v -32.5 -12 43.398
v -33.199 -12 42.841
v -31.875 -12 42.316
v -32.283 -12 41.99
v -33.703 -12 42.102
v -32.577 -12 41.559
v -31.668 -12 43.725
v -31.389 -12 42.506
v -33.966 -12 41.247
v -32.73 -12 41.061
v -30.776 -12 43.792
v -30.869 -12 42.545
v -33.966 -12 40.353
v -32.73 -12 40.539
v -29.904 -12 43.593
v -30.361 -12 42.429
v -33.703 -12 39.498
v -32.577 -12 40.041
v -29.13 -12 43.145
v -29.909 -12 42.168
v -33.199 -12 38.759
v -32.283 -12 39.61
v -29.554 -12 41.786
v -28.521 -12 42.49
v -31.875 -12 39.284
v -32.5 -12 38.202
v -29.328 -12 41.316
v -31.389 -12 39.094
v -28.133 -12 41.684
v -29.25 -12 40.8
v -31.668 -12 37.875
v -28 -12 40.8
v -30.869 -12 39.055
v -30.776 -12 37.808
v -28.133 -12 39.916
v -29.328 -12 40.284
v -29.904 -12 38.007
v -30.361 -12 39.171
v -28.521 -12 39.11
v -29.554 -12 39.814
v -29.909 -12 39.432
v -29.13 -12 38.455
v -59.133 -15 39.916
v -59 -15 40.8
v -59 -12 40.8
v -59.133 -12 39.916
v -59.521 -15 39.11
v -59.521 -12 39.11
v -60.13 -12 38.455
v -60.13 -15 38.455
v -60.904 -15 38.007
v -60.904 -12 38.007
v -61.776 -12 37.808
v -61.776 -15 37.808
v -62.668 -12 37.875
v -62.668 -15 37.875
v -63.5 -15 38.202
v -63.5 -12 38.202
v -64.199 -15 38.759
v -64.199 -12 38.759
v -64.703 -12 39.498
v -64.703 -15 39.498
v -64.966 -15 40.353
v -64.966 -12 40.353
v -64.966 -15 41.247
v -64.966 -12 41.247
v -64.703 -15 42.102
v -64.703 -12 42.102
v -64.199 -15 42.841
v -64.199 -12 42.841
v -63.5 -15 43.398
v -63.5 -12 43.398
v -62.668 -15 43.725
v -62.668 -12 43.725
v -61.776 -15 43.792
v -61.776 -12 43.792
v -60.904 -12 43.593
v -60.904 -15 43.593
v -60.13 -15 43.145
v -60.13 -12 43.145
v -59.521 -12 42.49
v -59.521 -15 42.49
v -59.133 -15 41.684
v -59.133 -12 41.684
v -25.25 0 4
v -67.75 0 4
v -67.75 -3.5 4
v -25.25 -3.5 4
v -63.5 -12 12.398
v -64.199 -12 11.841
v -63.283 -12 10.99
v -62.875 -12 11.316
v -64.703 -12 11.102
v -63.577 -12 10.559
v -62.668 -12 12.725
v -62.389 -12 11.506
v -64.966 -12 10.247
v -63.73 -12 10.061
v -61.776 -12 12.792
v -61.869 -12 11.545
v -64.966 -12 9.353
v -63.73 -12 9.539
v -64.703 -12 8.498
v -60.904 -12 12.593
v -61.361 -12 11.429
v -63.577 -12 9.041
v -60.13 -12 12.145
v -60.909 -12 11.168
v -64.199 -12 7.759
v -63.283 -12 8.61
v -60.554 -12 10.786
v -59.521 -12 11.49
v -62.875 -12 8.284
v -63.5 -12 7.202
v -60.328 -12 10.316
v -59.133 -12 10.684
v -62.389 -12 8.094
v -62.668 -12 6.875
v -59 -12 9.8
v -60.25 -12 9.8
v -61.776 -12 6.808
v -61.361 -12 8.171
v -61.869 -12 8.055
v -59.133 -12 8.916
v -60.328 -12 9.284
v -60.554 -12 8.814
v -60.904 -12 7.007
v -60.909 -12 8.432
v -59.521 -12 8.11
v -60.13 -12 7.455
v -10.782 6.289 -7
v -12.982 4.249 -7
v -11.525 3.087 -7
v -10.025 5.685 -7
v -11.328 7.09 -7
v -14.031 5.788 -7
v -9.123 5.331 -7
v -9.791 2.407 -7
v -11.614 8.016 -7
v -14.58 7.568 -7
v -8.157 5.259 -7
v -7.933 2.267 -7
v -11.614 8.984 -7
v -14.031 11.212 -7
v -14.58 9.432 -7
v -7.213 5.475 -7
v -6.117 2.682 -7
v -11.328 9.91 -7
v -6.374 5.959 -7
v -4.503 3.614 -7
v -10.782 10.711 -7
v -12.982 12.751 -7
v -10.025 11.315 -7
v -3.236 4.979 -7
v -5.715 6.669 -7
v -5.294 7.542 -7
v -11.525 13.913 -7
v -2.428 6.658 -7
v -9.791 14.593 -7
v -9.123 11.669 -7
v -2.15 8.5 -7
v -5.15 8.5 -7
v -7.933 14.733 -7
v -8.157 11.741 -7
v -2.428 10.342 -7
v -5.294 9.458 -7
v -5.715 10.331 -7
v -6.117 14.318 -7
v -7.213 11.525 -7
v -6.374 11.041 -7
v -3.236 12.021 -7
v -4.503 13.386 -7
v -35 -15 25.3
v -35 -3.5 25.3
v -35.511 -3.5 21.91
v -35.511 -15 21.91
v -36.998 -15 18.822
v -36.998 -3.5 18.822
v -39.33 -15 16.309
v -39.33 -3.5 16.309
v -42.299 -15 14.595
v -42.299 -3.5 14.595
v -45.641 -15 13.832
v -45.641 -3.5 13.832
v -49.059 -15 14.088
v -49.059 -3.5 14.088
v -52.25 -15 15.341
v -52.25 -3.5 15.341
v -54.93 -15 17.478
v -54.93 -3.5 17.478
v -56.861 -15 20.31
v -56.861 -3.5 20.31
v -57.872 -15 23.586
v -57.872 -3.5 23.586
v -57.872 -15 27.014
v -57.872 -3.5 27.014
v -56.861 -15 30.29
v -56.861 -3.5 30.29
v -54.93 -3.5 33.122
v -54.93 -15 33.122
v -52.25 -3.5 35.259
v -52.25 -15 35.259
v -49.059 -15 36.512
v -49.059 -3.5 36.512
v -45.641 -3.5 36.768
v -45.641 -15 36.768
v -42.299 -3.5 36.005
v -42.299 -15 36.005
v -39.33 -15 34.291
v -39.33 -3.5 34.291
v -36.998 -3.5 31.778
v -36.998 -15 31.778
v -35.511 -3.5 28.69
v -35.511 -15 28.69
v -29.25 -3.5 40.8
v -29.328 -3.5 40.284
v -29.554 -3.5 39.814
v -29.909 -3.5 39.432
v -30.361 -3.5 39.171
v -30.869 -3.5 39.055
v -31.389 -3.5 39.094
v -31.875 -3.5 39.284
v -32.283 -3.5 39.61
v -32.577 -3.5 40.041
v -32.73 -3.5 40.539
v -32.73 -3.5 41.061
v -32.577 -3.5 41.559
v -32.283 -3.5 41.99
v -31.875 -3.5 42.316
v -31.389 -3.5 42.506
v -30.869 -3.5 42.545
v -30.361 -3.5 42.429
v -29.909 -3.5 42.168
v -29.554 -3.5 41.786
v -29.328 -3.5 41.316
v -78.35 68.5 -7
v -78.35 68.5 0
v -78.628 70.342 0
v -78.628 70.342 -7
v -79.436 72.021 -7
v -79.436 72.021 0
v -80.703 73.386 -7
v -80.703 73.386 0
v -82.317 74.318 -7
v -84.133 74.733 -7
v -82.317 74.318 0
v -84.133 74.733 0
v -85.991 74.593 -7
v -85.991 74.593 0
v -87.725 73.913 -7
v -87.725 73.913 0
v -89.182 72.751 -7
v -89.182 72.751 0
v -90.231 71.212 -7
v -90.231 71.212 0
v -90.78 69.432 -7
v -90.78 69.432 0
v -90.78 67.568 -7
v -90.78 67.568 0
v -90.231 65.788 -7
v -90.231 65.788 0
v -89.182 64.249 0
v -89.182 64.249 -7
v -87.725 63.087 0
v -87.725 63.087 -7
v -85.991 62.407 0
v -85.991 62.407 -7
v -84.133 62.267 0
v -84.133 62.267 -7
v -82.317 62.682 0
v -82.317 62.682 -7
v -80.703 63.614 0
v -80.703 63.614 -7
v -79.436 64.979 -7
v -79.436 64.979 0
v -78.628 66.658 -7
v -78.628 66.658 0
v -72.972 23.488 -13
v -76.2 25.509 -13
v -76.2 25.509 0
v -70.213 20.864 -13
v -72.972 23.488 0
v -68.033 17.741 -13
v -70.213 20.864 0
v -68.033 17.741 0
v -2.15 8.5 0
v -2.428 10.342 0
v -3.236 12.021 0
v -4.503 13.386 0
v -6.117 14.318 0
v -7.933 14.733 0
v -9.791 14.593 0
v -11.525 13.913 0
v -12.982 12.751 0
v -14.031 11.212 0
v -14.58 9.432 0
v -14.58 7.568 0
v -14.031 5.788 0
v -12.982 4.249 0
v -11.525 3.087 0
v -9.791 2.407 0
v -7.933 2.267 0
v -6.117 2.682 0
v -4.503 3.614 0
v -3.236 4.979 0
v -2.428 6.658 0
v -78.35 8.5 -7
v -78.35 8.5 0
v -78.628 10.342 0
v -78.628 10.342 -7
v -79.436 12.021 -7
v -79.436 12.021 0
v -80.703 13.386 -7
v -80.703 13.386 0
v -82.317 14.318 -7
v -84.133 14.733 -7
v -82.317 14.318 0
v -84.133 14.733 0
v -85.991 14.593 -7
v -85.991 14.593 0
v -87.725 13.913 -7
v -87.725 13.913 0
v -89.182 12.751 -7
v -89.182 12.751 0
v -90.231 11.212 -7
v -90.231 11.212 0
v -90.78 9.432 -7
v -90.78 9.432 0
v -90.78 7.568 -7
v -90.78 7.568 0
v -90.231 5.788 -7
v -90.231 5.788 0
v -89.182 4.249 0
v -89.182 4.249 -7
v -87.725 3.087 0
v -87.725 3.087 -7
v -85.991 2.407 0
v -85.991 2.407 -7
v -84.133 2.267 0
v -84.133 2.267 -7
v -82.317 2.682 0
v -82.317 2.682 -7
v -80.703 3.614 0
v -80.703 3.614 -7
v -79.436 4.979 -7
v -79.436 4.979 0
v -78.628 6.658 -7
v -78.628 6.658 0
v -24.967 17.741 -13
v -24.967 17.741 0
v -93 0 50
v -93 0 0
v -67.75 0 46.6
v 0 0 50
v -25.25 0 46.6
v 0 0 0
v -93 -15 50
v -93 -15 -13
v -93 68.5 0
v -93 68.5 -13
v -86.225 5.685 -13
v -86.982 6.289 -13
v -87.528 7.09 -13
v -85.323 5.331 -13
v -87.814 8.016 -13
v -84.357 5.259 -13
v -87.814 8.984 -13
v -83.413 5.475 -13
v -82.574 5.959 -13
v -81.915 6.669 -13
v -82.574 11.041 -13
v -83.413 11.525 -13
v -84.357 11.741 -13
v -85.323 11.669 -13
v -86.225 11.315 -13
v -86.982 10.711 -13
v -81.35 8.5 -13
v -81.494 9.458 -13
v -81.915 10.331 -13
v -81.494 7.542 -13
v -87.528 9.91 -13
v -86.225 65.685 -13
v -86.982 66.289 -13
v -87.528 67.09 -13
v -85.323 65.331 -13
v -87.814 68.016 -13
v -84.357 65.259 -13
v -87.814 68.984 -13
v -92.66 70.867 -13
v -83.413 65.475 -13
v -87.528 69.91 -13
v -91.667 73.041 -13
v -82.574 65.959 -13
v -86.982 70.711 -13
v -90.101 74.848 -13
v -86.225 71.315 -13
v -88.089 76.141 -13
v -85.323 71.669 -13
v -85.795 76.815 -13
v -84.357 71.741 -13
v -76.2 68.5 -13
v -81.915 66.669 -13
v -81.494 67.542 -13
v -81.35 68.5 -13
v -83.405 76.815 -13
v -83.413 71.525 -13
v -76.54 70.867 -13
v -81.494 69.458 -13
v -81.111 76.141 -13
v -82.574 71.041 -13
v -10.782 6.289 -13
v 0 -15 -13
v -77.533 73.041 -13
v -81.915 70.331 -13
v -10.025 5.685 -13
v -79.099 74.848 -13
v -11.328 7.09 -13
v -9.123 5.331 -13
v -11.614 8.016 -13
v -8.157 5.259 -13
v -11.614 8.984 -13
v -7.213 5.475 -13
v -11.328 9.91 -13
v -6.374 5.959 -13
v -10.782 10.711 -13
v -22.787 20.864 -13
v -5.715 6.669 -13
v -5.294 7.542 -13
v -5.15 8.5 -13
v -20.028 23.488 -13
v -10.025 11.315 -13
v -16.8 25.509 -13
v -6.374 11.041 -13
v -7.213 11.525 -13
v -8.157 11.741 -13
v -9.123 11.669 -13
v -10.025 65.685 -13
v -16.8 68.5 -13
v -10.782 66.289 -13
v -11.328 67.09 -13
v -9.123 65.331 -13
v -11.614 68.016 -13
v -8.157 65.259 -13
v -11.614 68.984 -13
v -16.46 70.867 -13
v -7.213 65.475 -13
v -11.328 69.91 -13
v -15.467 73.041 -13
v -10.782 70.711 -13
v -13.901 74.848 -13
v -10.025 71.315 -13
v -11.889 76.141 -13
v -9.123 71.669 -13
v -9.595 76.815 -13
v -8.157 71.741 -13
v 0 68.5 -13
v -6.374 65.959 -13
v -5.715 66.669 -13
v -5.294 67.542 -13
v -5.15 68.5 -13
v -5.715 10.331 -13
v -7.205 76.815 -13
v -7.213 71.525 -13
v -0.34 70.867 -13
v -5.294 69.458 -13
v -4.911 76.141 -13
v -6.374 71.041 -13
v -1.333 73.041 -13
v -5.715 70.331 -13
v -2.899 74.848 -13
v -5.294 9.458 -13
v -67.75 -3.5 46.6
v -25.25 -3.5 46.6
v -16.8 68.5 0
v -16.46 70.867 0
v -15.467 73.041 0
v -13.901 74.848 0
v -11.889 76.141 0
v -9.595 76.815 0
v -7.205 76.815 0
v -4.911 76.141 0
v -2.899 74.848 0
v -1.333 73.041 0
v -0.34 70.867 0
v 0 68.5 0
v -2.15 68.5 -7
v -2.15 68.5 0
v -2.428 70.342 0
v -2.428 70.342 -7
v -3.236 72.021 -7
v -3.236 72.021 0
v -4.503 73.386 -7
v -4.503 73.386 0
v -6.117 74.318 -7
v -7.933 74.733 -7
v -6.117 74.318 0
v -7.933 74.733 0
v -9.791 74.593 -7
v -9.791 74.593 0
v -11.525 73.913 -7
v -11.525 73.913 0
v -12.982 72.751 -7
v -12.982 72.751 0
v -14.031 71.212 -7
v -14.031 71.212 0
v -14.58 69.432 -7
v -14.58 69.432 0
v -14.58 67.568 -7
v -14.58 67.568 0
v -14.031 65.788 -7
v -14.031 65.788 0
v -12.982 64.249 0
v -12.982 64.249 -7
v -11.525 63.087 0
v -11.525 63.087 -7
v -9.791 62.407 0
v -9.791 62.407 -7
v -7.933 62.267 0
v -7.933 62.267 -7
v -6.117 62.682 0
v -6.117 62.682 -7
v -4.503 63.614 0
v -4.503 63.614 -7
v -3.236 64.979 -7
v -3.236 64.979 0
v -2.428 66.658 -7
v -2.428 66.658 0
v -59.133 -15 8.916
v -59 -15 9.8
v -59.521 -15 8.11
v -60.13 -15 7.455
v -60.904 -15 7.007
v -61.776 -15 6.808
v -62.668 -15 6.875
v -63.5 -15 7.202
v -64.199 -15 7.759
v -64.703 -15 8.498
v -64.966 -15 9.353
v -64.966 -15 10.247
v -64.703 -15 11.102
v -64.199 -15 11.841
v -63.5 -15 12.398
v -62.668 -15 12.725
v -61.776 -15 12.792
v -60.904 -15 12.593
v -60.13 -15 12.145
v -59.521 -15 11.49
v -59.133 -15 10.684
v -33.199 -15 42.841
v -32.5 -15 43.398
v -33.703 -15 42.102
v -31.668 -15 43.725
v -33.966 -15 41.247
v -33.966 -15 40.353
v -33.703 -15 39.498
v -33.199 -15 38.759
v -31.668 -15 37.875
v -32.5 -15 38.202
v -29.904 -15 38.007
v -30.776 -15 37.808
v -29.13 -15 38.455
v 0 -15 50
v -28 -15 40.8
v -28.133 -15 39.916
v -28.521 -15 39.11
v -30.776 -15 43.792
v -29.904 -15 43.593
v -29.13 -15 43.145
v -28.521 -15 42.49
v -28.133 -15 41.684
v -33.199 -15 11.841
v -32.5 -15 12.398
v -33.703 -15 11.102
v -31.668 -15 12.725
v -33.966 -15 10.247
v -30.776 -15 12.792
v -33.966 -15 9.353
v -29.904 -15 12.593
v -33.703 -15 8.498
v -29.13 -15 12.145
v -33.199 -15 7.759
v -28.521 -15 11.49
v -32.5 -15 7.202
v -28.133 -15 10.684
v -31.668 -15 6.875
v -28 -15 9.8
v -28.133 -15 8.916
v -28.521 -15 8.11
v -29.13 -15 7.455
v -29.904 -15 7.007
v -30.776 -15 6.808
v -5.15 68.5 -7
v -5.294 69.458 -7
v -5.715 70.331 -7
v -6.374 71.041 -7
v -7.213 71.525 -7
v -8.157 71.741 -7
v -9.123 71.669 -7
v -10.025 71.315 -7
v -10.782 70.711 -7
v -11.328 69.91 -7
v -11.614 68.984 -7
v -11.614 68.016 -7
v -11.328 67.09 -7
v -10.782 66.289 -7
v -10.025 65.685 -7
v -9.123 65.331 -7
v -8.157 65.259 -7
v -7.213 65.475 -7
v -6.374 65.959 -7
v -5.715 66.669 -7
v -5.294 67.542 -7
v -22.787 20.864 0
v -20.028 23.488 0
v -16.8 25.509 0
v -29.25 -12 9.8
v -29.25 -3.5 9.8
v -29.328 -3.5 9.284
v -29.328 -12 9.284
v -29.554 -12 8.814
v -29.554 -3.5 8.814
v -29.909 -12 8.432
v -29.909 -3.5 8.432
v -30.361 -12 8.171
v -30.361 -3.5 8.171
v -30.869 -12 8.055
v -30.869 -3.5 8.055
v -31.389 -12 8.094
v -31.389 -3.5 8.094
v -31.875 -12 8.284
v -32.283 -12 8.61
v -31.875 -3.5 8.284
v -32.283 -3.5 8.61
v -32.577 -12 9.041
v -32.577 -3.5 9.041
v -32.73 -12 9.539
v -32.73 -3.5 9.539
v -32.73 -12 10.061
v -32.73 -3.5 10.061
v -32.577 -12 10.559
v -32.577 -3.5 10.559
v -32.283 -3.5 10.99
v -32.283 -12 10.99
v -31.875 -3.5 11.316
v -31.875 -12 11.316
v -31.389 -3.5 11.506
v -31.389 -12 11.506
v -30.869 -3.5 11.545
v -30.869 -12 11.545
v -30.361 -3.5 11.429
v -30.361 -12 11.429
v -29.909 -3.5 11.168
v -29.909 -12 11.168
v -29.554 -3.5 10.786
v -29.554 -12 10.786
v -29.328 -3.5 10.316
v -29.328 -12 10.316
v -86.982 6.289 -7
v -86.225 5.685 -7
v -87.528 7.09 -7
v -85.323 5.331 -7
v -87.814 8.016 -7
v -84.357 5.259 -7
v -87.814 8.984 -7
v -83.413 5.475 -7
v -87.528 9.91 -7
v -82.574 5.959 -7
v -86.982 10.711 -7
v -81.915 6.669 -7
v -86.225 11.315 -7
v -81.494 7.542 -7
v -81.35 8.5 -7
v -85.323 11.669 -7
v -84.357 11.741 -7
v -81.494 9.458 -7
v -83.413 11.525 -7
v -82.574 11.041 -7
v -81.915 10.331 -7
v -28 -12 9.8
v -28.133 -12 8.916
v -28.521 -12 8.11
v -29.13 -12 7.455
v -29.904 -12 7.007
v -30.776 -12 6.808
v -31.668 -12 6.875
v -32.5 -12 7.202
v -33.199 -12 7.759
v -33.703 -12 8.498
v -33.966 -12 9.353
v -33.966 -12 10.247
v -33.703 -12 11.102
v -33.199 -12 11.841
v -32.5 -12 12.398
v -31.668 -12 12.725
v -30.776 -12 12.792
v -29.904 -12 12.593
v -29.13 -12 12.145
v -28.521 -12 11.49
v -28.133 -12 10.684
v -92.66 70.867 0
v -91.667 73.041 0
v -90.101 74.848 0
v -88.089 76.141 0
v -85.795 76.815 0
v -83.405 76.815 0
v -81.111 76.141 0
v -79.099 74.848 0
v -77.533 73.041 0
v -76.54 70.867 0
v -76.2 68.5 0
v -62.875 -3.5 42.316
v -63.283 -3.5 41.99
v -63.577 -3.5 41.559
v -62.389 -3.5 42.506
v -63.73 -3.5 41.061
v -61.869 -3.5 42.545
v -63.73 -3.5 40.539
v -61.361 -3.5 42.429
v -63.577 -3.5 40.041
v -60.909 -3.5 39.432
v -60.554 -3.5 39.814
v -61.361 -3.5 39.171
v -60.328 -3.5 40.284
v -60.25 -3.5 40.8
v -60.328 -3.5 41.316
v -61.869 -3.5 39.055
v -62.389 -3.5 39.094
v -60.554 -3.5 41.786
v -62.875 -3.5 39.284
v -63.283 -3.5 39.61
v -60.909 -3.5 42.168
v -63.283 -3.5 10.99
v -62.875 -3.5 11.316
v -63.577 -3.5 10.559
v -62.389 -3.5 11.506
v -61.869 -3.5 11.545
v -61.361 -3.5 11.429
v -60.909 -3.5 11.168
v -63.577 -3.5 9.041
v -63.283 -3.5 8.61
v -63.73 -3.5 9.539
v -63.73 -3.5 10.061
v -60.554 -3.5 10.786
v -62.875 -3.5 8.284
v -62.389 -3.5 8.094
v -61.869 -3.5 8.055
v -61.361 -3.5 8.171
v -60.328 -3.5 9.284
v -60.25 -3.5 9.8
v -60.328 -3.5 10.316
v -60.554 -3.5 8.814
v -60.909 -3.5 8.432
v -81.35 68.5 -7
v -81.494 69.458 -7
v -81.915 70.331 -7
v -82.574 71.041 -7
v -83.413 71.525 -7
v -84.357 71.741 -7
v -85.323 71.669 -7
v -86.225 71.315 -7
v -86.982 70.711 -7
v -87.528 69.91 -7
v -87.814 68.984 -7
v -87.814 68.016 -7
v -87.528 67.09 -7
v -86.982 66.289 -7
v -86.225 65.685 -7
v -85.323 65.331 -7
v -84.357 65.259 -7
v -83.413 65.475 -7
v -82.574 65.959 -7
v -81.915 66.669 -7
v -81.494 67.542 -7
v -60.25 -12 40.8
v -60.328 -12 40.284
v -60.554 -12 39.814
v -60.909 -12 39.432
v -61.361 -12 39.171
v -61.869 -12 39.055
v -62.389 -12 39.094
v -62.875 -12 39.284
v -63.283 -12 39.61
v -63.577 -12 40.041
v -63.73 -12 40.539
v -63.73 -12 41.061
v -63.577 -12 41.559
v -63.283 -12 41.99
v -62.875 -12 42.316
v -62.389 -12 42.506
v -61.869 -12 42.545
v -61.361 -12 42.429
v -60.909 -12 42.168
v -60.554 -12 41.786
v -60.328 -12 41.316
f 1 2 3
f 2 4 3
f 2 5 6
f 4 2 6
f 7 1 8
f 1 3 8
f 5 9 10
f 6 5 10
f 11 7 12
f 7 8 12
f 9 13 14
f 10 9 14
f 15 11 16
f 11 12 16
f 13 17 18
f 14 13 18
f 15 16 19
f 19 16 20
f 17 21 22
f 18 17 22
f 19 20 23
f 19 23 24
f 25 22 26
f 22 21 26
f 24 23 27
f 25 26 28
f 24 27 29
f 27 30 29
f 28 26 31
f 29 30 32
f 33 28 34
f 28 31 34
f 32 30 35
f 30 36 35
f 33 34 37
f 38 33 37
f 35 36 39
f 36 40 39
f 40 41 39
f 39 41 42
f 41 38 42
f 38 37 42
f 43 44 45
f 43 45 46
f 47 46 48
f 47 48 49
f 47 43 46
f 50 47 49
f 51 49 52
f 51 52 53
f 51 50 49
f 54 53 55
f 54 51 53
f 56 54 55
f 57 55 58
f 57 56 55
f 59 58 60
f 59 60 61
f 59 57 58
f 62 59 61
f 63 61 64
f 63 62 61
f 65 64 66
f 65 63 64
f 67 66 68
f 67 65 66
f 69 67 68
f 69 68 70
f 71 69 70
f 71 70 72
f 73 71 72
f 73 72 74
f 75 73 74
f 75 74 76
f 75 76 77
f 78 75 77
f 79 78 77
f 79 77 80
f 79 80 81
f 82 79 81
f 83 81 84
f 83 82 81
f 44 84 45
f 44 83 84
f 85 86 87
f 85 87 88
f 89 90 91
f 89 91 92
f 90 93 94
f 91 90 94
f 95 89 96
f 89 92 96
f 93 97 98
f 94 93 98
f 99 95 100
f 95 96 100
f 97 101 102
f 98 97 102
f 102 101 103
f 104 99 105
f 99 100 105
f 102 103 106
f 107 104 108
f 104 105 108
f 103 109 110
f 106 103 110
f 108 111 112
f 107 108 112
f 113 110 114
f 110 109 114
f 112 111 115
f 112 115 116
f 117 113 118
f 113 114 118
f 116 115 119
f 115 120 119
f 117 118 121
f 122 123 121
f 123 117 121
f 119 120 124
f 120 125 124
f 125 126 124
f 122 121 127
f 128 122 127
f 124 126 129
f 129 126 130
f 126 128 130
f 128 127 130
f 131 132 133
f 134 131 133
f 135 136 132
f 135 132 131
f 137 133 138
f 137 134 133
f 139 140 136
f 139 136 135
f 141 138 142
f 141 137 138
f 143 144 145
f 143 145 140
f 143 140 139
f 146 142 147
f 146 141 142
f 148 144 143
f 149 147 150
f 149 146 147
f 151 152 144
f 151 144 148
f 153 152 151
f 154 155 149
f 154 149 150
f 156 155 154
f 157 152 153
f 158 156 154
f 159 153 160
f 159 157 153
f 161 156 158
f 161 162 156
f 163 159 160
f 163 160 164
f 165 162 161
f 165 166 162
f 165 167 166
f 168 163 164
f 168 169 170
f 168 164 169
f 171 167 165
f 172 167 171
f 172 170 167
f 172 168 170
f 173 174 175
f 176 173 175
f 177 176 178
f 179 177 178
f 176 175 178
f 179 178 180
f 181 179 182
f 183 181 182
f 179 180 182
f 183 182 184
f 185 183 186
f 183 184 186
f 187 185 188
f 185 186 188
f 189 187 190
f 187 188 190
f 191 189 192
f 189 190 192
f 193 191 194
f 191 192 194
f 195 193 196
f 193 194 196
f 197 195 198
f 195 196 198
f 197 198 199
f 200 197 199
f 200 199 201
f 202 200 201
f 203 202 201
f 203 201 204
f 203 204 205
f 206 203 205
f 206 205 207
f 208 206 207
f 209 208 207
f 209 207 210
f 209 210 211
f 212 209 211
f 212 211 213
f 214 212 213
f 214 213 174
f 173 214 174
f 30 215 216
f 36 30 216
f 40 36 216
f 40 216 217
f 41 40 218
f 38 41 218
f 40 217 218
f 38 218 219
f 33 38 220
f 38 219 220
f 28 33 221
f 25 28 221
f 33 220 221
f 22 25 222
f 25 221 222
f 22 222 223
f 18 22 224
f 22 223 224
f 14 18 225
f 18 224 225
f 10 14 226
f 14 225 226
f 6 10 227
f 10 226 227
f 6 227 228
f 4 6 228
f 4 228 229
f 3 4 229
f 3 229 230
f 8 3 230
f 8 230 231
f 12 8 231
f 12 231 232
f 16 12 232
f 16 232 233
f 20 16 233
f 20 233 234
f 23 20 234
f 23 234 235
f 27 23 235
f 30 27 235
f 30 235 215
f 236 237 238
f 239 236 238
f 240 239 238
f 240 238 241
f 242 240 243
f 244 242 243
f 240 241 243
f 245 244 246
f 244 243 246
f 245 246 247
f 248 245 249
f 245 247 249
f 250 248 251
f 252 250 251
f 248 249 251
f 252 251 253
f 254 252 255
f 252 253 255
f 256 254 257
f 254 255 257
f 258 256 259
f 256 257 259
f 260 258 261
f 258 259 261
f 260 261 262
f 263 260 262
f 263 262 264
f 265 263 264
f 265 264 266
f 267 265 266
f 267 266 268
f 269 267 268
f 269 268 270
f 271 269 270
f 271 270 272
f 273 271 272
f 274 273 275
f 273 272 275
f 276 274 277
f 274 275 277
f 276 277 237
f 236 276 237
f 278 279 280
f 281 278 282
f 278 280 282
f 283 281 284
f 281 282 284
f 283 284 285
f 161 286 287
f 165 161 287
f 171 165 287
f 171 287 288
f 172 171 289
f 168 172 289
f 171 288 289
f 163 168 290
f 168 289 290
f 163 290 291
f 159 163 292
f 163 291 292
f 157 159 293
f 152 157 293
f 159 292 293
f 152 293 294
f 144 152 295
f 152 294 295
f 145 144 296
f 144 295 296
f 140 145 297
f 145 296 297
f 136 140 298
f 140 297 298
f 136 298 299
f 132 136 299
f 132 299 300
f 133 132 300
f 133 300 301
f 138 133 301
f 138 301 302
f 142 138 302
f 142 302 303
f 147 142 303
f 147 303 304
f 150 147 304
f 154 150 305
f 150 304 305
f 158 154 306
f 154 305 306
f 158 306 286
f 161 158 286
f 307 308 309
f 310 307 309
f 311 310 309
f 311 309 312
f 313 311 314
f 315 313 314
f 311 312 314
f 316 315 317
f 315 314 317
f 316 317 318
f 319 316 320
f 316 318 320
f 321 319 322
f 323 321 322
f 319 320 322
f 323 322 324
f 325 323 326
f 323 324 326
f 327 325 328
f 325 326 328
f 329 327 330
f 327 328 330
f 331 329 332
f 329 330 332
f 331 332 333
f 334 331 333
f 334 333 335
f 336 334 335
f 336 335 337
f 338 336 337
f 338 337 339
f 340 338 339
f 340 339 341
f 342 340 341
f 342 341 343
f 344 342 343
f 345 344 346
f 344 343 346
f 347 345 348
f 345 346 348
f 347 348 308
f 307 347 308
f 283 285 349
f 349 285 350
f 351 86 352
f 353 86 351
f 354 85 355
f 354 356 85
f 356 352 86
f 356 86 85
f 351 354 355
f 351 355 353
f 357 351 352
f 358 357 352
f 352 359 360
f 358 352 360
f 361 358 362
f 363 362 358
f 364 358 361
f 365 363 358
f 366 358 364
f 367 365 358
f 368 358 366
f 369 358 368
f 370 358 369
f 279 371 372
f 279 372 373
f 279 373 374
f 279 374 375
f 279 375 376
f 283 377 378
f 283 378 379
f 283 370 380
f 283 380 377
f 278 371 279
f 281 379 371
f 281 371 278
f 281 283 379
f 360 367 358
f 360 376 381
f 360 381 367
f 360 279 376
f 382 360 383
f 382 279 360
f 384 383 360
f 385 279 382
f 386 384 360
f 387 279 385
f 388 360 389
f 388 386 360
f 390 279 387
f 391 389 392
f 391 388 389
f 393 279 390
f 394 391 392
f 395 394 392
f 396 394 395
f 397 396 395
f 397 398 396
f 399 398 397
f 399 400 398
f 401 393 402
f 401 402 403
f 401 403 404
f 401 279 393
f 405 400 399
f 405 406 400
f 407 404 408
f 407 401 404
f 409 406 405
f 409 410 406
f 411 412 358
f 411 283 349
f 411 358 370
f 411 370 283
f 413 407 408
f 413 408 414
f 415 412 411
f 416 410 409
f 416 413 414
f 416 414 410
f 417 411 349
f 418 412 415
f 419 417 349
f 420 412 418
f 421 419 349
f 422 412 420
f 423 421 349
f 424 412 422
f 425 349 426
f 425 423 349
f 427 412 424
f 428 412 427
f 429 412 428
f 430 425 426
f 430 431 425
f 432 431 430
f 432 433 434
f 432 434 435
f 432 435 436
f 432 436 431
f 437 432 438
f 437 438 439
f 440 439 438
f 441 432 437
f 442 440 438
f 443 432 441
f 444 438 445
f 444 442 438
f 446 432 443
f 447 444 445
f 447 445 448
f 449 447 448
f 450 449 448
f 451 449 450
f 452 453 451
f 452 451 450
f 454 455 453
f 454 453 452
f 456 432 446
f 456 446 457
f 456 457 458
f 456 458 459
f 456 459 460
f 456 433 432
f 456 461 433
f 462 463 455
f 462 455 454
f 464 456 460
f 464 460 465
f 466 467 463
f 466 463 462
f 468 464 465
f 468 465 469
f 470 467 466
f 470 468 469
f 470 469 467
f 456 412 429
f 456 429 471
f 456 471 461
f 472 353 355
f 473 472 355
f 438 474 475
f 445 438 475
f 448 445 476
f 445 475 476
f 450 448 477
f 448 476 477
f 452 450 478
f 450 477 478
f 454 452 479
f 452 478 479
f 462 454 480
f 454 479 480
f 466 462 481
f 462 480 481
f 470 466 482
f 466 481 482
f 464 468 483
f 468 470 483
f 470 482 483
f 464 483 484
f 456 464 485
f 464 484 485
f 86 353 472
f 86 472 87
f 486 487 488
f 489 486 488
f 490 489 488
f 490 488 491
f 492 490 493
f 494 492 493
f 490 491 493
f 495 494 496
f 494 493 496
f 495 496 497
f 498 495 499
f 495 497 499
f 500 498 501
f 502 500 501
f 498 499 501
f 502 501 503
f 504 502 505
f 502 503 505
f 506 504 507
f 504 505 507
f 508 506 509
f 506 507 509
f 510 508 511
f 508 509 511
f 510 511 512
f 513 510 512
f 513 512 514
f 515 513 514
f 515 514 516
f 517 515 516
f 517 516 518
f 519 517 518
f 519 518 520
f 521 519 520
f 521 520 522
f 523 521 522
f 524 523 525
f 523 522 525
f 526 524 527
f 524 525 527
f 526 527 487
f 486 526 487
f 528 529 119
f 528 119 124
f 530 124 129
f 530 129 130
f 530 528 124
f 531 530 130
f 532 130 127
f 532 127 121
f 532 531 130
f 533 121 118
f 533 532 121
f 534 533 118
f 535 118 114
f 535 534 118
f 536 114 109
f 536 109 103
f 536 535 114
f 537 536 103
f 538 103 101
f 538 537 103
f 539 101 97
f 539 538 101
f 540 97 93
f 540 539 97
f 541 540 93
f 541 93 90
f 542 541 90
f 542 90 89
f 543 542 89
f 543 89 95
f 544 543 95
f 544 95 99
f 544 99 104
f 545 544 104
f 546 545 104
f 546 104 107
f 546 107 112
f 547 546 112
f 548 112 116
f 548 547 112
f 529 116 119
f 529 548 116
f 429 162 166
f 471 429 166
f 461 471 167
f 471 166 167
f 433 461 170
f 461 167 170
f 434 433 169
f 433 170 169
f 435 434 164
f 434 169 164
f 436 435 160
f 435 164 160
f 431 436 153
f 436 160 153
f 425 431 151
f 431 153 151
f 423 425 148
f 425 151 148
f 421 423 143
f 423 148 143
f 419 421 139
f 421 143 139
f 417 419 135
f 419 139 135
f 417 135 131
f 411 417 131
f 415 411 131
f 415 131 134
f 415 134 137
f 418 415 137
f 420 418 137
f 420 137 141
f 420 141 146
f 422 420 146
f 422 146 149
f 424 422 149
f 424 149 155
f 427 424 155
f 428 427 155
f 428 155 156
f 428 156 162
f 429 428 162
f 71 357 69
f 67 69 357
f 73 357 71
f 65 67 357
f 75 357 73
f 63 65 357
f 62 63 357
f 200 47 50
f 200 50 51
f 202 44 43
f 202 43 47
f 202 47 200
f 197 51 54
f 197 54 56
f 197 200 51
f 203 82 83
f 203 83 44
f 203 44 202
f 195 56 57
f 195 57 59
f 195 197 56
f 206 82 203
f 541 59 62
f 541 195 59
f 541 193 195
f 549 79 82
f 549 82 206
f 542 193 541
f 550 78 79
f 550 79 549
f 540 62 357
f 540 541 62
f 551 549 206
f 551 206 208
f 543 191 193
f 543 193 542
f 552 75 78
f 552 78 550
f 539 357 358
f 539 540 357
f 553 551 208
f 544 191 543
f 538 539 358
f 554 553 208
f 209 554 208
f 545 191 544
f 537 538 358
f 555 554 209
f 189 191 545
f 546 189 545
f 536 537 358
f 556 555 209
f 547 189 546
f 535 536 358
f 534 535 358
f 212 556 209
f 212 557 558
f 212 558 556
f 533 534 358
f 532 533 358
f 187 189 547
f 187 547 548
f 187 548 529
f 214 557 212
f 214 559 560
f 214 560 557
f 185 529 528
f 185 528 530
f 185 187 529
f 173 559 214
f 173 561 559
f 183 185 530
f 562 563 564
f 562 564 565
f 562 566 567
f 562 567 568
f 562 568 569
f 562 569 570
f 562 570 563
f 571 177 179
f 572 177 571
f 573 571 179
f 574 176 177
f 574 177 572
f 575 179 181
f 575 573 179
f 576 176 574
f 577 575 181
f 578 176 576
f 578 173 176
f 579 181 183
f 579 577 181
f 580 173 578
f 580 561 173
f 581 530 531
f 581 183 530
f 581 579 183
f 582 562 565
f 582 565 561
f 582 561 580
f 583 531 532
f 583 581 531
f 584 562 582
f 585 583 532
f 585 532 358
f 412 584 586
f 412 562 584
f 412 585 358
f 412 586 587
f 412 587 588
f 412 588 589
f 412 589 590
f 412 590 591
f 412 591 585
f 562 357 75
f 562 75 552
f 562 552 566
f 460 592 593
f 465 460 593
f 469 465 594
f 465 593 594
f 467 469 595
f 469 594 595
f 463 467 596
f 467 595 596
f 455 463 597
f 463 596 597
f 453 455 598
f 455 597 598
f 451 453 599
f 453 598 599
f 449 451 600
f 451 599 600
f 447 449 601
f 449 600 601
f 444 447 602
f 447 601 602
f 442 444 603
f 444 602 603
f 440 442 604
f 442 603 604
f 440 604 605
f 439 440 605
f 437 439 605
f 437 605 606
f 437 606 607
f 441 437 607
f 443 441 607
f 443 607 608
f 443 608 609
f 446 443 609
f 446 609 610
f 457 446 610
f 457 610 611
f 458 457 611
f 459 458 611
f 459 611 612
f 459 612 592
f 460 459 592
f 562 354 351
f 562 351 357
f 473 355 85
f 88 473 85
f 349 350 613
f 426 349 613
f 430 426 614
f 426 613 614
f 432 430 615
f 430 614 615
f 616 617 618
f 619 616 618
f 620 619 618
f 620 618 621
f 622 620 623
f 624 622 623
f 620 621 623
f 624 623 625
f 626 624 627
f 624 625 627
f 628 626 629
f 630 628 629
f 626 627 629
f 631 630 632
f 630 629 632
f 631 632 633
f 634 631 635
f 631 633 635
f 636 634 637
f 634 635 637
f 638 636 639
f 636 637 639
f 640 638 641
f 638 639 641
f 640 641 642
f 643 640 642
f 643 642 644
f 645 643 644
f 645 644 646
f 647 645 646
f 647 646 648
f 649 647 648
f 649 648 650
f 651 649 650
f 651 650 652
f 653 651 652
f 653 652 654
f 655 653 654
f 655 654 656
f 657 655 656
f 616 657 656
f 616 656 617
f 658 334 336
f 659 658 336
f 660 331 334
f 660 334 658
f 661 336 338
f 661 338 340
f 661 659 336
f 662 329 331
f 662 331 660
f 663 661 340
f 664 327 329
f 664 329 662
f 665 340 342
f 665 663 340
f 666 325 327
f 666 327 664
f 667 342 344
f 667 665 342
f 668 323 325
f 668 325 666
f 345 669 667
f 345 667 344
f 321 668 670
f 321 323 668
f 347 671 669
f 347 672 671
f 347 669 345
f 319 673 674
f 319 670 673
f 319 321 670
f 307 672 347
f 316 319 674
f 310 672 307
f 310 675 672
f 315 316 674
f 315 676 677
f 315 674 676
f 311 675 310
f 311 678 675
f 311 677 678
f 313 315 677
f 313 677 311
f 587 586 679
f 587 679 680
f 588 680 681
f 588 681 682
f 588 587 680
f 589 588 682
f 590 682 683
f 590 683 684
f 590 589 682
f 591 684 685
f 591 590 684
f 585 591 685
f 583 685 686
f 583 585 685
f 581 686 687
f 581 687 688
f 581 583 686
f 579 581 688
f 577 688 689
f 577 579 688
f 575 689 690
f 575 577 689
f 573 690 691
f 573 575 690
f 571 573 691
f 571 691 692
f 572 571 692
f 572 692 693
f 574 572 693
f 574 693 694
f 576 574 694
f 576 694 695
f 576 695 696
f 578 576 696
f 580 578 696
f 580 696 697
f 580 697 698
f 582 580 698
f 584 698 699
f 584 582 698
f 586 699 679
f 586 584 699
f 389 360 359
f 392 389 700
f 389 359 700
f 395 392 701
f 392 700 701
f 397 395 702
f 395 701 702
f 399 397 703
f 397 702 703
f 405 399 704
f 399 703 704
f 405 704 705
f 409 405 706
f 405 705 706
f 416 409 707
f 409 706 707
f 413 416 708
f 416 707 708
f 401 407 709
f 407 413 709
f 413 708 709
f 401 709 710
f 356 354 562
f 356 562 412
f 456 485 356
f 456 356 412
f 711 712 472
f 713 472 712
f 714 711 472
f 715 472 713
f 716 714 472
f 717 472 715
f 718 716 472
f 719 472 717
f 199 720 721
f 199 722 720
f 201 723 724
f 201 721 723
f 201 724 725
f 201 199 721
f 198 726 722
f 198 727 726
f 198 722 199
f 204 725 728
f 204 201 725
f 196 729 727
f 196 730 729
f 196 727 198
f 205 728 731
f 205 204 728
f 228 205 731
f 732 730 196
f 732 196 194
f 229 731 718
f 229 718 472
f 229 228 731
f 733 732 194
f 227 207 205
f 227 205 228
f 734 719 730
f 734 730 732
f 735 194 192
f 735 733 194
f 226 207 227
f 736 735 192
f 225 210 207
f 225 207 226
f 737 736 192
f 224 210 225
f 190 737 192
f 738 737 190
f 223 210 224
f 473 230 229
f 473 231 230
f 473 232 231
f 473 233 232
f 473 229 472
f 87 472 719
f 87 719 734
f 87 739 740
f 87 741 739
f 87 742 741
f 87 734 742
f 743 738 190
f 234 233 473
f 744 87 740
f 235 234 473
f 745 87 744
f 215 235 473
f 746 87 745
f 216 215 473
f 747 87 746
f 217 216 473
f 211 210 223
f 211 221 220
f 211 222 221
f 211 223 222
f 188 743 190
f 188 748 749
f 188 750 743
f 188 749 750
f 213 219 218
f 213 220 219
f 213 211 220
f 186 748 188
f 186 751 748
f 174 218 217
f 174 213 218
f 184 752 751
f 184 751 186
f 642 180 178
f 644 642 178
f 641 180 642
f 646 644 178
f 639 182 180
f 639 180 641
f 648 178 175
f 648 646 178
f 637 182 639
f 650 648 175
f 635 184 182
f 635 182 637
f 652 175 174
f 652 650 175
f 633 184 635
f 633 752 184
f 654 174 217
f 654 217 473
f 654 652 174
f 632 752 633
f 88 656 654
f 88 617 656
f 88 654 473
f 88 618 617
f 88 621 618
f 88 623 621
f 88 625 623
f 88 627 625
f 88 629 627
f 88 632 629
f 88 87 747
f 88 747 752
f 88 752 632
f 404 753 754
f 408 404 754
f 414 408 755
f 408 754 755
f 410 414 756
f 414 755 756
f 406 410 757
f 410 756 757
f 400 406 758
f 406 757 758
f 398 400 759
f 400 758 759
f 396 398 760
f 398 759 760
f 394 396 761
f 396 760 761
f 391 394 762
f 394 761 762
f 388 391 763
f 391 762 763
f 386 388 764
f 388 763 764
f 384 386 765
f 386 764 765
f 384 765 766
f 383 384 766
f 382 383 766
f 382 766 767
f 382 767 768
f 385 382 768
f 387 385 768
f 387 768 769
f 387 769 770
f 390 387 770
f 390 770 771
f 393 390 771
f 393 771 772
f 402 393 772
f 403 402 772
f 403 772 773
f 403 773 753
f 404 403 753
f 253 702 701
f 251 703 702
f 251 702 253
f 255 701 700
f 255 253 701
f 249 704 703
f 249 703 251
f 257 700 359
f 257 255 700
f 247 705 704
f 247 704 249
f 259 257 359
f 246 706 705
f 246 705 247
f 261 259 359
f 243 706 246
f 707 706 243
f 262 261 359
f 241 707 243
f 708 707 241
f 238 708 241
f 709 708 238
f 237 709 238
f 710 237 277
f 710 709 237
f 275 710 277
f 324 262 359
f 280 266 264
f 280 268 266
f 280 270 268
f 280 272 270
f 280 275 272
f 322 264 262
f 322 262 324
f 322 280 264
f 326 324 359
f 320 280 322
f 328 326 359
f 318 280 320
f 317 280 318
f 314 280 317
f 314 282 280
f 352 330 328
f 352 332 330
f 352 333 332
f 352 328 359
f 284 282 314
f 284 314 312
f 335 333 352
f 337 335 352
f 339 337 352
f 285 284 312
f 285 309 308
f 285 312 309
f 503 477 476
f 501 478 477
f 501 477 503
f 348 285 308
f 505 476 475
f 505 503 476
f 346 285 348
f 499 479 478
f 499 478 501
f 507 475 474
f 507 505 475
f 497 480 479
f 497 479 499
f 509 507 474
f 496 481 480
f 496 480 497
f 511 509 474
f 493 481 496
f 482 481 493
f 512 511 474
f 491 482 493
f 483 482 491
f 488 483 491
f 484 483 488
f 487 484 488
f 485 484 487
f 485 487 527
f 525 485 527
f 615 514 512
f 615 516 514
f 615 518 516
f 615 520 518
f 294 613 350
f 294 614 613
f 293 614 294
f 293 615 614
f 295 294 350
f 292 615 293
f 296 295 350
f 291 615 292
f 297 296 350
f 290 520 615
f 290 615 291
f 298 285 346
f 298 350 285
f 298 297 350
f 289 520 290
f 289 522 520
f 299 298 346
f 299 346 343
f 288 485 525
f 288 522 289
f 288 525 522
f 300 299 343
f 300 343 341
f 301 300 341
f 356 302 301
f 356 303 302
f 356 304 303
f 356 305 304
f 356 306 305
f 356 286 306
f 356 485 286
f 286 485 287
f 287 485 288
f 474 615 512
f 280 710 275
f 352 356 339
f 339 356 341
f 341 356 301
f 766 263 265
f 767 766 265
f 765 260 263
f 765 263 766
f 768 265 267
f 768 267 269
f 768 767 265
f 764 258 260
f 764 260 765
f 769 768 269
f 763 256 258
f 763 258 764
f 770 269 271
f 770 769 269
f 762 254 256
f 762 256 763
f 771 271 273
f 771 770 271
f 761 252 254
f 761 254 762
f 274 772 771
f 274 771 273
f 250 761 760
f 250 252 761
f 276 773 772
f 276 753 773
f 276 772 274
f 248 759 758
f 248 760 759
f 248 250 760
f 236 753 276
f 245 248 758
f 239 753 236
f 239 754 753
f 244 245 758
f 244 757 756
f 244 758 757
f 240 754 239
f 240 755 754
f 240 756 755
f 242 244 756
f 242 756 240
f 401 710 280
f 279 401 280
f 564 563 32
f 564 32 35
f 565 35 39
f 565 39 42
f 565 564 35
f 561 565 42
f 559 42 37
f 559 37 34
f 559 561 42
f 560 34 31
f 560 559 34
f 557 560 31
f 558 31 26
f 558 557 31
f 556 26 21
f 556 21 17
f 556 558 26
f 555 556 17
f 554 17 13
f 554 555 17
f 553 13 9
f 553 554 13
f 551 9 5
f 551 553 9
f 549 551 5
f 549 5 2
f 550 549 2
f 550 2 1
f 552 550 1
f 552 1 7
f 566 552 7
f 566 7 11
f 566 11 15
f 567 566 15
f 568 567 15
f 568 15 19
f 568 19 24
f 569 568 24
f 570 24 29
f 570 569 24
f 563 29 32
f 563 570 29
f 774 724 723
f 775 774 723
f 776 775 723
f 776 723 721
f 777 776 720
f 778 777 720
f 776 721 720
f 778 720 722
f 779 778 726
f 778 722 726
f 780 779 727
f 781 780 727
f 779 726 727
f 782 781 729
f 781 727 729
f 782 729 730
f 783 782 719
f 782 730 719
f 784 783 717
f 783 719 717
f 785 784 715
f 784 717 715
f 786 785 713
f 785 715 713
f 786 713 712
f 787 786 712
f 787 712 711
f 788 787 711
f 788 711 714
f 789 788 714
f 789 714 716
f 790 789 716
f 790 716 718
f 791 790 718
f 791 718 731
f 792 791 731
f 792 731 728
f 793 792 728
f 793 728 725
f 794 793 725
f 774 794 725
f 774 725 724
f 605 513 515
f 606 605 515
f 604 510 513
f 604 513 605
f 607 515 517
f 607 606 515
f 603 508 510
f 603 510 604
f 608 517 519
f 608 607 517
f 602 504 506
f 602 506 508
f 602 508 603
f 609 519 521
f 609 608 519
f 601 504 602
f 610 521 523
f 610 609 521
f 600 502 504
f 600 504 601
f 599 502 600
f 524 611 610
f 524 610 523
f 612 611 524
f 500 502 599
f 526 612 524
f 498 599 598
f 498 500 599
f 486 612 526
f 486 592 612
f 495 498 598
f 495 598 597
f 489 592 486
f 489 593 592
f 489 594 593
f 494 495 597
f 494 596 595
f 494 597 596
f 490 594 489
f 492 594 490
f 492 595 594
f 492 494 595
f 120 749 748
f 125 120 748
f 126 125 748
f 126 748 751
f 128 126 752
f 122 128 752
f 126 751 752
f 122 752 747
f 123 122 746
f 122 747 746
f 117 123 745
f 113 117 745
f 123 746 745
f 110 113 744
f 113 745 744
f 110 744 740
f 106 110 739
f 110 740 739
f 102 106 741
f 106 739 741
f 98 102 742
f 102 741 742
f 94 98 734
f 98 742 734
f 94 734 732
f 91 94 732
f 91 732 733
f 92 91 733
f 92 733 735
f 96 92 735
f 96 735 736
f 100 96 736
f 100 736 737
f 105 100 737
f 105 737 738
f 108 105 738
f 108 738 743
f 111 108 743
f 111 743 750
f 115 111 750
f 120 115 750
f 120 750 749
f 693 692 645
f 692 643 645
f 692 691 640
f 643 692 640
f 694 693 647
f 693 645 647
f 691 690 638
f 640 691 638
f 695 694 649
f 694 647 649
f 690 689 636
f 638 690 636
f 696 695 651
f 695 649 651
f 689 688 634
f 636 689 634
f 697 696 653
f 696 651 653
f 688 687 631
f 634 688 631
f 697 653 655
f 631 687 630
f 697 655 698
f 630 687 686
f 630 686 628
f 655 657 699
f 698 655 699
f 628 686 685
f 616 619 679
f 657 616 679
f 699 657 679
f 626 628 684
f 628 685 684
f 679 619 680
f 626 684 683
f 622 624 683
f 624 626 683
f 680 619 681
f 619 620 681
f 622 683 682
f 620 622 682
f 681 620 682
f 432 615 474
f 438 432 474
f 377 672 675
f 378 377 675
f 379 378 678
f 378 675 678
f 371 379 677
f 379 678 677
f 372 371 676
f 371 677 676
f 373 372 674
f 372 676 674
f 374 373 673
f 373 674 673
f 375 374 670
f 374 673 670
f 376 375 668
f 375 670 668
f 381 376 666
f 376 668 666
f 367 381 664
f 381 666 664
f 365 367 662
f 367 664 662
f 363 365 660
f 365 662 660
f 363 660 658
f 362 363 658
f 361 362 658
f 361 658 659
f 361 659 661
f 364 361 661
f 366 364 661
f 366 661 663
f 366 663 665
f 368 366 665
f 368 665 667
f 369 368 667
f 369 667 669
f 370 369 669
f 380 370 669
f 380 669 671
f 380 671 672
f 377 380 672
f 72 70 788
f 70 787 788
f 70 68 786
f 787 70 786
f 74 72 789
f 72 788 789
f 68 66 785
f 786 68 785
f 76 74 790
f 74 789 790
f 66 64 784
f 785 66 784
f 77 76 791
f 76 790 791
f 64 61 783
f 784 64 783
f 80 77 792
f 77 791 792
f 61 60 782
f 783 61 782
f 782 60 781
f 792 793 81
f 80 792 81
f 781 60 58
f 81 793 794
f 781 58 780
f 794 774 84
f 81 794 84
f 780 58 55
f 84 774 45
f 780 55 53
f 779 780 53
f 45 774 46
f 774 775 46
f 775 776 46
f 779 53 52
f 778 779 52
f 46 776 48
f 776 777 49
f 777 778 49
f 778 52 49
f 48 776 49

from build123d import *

# Parameters (mm, degrees)
BOSS_EXTRUDE1_DEPTH     = 93
SKETCH2_W               = 42.5
SKETCH2_H               = 42.6
CUT_EXTRUDE1_DEPTH      = 3.5
SKETCH3_R               = 11.5
CUT_EXTRUDE2_DEPTH      = 12.5
SKETCH4_R               = 1.75
CUT_EXTRUDE3_DEPTH      = 12.5
CUT_EXTRUDE4_START      = -11.5
SKETCH4_3_R             = 3
SKETCH4_3_R_2           = 1.75
CUT_EXTRUDE4_DEPTH      = 3
SKETCH5_R               = 3.25
CUT_EXTRUDE5_DEPTH      = 51
CUT_EXTRUDE5_DEPTH_BACK = 14
SKETCH5_3_R             = 6.25
SKETCH5_3_R_2           = 3.25
CUT_EXTRUDE6_DEPTH      = 51
CUT_EXTRUDE6_DEPTH_BACK = 7
CUT_EXTRUDE7_DEPTH      = 14


with BuildPart() as part:
    # Sketch1 → Boss-Extrude1 (new body)
    with BuildSketch(Plane(origin=(0, 0, 0), x_dir=(0, 0, -1), z_dir=(1, 0, 0))):
        Polygon((0, 0), (-50, 0), (-50, -15), (13, -15), (13, 86.965010888), (0, 86.965010888), align=None)
    extrude(amount=-BOSS_EXTRUDE1_DEPTH)

    # Sketch2 → Cut-Extrude1 (cut)
    with BuildSketch(Plane(origin=(0, 0, 0), x_dir=(1, 0, 0), z_dir=(0, 1, 0))):
        with Locations((-46.5, -25.3)):
            Rectangle(SKETCH2_W, SKETCH2_H)
    extrude(amount=-CUT_EXTRUDE1_DEPTH, mode=Mode.SUBTRACT)

    # Sketch3 → Cut-Extrude2 (cut, through all)
    with BuildSketch(Plane(origin=(0, -3.5, 0), x_dir=(1, 0, 0), z_dir=(0, 1, 0))):
        with Locations((-46.5, -25.3)):
            Circle(SKETCH3_R)
    extrude(amount=-CUT_EXTRUDE2_DEPTH, mode=Mode.SUBTRACT)

    # Sketch4 → Cut-Extrude3 (cut, through all)
    with BuildSketch(Plane(origin=(0, -3.5, 0), x_dir=(1, 0, 0), z_dir=(0, 1, 0))):
        with Locations((-62, -9.8)):
            Circle(SKETCH4_R)
        with Locations((-31, -9.8)):
            Circle(SKETCH4_R)
        with Locations((-31, -40.8)):
            Circle(SKETCH4_R)
        with Locations((-62, -40.8)):
            Circle(SKETCH4_R)
    extrude(amount=-CUT_EXTRUDE3_DEPTH, mode=Mode.SUBTRACT)

    # Sketch4_3 → Cut-Extrude4 (cut)
    with BuildSketch(Plane(origin=(0, -3.5, 0), x_dir=(1, 0, 0), z_dir=(0, 1, 0)).offset(CUT_EXTRUDE4_START)):
        with Locations((-62, -9.8)):
            Circle(SKETCH4_3_R)
        with Locations((-62, -9.8)):
            Circle(SKETCH4_3_R_2, mode=Mode.SUBTRACT)
        with Locations((-31, -9.8)):
            Circle(SKETCH4_3_R)
        with Locations((-31, -9.8)):
            Circle(SKETCH4_3_R_2, mode=Mode.SUBTRACT)
        with Locations((-31, -40.8)):
            Circle(SKETCH4_3_R)
        with Locations((-31, -40.8)):
            Circle(SKETCH4_3_R_2, mode=Mode.SUBTRACT)
        with Locations((-62, -40.8)):
            Circle(SKETCH4_3_R)
        with Locations((-62, -40.8)):
            Circle(SKETCH4_3_R_2, mode=Mode.SUBTRACT)
    extrude(amount=CUT_EXTRUDE4_DEPTH, mode=Mode.SUBTRACT)

    # Sketch5 → Cut-Extrude5 (cut, two sides)
    with BuildSketch(Plane.XY) as cut_extrude5_sk:
        with Locations((-84.6, 68.5)):
            Circle(SKETCH5_R)
        with Locations((-8.4, 68.5)):
            Circle(SKETCH5_R)
        with Locations((-8.4, 8.5)):
            Circle(SKETCH5_R)
        with Locations((-84.6, 8.5)):
            Circle(SKETCH5_R)
    extrude(amount=CUT_EXTRUDE5_DEPTH, mode=Mode.SUBTRACT)
    extrude(cut_extrude5_sk.sketch, amount=-CUT_EXTRUDE5_DEPTH_BACK, mode=Mode.SUBTRACT)

    # Sketch5_3 → Cut-Extrude6 (cut, two sides)
    with BuildSketch(Plane.XY) as cut_extrude6_sk:
        with Locations((-84.6, 68.5)):
            Circle(SKETCH5_3_R)
        with Locations((-84.6, 68.5)):
            Circle(SKETCH5_3_R_2, mode=Mode.SUBTRACT)
        with Locations((-84.6, 8.5)):
            Circle(SKETCH5_3_R)
        with Locations((-84.6, 8.5)):
            Circle(SKETCH5_3_R_2, mode=Mode.SUBTRACT)
        with Locations((-8.4, 8.5)):
            Circle(SKETCH5_3_R)
        with Locations((-8.4, 8.5)):
            Circle(SKETCH5_3_R_2, mode=Mode.SUBTRACT)
        with Locations((-8.4, 68.5)):
            Circle(SKETCH5_3_R)
        with Locations((-8.4, 68.5)):
            Circle(SKETCH5_3_R_2, mode=Mode.SUBTRACT)
    extrude(amount=CUT_EXTRUDE6_DEPTH, mode=Mode.SUBTRACT)
    extrude(cut_extrude6_sk.sketch, amount=-CUT_EXTRUDE6_DEPTH_BACK, mode=Mode.SUBTRACT)

    # Sketch7 → Cut-Extrude7 (cut, through all)
    with BuildSketch(Plane.XY):
        with BuildLine():
            Line((-93, 86.965010888), (-93, 68.5))
            ThreePointArc((-93, 68.5), (-84.6, 76.9), (-76.2, 68.5))
            Line((-76.2, 68.5), (-76.2, 25.508589177))
            ThreePointArc((-76.2, 25.508589177), (-71.526556974, 22.245442635), (-68.033447852, 17.741290803))
            Line((-68.033447852, 17.741290803), (-24.966552148, 17.741290803))
            ThreePointArc((-24.966552148, 17.741290803), (-21.473443026, 22.245442635), (-16.8, 25.508589177))
            Line((-16.8, 25.508589177), (-16.8, 68.5))
            ThreePointArc((-16.8, 68.5), (-8.4, 76.9), (0, 68.5))
            Line((0, 68.5), (0, 86.965010888))
            Line((0, 86.965010888), (-93, 86.965010888))
        make_face()
    extrude(amount=-CUT_EXTRUDE7_DEPTH, mode=Mode.SUBTRACT)


solid = part.part
